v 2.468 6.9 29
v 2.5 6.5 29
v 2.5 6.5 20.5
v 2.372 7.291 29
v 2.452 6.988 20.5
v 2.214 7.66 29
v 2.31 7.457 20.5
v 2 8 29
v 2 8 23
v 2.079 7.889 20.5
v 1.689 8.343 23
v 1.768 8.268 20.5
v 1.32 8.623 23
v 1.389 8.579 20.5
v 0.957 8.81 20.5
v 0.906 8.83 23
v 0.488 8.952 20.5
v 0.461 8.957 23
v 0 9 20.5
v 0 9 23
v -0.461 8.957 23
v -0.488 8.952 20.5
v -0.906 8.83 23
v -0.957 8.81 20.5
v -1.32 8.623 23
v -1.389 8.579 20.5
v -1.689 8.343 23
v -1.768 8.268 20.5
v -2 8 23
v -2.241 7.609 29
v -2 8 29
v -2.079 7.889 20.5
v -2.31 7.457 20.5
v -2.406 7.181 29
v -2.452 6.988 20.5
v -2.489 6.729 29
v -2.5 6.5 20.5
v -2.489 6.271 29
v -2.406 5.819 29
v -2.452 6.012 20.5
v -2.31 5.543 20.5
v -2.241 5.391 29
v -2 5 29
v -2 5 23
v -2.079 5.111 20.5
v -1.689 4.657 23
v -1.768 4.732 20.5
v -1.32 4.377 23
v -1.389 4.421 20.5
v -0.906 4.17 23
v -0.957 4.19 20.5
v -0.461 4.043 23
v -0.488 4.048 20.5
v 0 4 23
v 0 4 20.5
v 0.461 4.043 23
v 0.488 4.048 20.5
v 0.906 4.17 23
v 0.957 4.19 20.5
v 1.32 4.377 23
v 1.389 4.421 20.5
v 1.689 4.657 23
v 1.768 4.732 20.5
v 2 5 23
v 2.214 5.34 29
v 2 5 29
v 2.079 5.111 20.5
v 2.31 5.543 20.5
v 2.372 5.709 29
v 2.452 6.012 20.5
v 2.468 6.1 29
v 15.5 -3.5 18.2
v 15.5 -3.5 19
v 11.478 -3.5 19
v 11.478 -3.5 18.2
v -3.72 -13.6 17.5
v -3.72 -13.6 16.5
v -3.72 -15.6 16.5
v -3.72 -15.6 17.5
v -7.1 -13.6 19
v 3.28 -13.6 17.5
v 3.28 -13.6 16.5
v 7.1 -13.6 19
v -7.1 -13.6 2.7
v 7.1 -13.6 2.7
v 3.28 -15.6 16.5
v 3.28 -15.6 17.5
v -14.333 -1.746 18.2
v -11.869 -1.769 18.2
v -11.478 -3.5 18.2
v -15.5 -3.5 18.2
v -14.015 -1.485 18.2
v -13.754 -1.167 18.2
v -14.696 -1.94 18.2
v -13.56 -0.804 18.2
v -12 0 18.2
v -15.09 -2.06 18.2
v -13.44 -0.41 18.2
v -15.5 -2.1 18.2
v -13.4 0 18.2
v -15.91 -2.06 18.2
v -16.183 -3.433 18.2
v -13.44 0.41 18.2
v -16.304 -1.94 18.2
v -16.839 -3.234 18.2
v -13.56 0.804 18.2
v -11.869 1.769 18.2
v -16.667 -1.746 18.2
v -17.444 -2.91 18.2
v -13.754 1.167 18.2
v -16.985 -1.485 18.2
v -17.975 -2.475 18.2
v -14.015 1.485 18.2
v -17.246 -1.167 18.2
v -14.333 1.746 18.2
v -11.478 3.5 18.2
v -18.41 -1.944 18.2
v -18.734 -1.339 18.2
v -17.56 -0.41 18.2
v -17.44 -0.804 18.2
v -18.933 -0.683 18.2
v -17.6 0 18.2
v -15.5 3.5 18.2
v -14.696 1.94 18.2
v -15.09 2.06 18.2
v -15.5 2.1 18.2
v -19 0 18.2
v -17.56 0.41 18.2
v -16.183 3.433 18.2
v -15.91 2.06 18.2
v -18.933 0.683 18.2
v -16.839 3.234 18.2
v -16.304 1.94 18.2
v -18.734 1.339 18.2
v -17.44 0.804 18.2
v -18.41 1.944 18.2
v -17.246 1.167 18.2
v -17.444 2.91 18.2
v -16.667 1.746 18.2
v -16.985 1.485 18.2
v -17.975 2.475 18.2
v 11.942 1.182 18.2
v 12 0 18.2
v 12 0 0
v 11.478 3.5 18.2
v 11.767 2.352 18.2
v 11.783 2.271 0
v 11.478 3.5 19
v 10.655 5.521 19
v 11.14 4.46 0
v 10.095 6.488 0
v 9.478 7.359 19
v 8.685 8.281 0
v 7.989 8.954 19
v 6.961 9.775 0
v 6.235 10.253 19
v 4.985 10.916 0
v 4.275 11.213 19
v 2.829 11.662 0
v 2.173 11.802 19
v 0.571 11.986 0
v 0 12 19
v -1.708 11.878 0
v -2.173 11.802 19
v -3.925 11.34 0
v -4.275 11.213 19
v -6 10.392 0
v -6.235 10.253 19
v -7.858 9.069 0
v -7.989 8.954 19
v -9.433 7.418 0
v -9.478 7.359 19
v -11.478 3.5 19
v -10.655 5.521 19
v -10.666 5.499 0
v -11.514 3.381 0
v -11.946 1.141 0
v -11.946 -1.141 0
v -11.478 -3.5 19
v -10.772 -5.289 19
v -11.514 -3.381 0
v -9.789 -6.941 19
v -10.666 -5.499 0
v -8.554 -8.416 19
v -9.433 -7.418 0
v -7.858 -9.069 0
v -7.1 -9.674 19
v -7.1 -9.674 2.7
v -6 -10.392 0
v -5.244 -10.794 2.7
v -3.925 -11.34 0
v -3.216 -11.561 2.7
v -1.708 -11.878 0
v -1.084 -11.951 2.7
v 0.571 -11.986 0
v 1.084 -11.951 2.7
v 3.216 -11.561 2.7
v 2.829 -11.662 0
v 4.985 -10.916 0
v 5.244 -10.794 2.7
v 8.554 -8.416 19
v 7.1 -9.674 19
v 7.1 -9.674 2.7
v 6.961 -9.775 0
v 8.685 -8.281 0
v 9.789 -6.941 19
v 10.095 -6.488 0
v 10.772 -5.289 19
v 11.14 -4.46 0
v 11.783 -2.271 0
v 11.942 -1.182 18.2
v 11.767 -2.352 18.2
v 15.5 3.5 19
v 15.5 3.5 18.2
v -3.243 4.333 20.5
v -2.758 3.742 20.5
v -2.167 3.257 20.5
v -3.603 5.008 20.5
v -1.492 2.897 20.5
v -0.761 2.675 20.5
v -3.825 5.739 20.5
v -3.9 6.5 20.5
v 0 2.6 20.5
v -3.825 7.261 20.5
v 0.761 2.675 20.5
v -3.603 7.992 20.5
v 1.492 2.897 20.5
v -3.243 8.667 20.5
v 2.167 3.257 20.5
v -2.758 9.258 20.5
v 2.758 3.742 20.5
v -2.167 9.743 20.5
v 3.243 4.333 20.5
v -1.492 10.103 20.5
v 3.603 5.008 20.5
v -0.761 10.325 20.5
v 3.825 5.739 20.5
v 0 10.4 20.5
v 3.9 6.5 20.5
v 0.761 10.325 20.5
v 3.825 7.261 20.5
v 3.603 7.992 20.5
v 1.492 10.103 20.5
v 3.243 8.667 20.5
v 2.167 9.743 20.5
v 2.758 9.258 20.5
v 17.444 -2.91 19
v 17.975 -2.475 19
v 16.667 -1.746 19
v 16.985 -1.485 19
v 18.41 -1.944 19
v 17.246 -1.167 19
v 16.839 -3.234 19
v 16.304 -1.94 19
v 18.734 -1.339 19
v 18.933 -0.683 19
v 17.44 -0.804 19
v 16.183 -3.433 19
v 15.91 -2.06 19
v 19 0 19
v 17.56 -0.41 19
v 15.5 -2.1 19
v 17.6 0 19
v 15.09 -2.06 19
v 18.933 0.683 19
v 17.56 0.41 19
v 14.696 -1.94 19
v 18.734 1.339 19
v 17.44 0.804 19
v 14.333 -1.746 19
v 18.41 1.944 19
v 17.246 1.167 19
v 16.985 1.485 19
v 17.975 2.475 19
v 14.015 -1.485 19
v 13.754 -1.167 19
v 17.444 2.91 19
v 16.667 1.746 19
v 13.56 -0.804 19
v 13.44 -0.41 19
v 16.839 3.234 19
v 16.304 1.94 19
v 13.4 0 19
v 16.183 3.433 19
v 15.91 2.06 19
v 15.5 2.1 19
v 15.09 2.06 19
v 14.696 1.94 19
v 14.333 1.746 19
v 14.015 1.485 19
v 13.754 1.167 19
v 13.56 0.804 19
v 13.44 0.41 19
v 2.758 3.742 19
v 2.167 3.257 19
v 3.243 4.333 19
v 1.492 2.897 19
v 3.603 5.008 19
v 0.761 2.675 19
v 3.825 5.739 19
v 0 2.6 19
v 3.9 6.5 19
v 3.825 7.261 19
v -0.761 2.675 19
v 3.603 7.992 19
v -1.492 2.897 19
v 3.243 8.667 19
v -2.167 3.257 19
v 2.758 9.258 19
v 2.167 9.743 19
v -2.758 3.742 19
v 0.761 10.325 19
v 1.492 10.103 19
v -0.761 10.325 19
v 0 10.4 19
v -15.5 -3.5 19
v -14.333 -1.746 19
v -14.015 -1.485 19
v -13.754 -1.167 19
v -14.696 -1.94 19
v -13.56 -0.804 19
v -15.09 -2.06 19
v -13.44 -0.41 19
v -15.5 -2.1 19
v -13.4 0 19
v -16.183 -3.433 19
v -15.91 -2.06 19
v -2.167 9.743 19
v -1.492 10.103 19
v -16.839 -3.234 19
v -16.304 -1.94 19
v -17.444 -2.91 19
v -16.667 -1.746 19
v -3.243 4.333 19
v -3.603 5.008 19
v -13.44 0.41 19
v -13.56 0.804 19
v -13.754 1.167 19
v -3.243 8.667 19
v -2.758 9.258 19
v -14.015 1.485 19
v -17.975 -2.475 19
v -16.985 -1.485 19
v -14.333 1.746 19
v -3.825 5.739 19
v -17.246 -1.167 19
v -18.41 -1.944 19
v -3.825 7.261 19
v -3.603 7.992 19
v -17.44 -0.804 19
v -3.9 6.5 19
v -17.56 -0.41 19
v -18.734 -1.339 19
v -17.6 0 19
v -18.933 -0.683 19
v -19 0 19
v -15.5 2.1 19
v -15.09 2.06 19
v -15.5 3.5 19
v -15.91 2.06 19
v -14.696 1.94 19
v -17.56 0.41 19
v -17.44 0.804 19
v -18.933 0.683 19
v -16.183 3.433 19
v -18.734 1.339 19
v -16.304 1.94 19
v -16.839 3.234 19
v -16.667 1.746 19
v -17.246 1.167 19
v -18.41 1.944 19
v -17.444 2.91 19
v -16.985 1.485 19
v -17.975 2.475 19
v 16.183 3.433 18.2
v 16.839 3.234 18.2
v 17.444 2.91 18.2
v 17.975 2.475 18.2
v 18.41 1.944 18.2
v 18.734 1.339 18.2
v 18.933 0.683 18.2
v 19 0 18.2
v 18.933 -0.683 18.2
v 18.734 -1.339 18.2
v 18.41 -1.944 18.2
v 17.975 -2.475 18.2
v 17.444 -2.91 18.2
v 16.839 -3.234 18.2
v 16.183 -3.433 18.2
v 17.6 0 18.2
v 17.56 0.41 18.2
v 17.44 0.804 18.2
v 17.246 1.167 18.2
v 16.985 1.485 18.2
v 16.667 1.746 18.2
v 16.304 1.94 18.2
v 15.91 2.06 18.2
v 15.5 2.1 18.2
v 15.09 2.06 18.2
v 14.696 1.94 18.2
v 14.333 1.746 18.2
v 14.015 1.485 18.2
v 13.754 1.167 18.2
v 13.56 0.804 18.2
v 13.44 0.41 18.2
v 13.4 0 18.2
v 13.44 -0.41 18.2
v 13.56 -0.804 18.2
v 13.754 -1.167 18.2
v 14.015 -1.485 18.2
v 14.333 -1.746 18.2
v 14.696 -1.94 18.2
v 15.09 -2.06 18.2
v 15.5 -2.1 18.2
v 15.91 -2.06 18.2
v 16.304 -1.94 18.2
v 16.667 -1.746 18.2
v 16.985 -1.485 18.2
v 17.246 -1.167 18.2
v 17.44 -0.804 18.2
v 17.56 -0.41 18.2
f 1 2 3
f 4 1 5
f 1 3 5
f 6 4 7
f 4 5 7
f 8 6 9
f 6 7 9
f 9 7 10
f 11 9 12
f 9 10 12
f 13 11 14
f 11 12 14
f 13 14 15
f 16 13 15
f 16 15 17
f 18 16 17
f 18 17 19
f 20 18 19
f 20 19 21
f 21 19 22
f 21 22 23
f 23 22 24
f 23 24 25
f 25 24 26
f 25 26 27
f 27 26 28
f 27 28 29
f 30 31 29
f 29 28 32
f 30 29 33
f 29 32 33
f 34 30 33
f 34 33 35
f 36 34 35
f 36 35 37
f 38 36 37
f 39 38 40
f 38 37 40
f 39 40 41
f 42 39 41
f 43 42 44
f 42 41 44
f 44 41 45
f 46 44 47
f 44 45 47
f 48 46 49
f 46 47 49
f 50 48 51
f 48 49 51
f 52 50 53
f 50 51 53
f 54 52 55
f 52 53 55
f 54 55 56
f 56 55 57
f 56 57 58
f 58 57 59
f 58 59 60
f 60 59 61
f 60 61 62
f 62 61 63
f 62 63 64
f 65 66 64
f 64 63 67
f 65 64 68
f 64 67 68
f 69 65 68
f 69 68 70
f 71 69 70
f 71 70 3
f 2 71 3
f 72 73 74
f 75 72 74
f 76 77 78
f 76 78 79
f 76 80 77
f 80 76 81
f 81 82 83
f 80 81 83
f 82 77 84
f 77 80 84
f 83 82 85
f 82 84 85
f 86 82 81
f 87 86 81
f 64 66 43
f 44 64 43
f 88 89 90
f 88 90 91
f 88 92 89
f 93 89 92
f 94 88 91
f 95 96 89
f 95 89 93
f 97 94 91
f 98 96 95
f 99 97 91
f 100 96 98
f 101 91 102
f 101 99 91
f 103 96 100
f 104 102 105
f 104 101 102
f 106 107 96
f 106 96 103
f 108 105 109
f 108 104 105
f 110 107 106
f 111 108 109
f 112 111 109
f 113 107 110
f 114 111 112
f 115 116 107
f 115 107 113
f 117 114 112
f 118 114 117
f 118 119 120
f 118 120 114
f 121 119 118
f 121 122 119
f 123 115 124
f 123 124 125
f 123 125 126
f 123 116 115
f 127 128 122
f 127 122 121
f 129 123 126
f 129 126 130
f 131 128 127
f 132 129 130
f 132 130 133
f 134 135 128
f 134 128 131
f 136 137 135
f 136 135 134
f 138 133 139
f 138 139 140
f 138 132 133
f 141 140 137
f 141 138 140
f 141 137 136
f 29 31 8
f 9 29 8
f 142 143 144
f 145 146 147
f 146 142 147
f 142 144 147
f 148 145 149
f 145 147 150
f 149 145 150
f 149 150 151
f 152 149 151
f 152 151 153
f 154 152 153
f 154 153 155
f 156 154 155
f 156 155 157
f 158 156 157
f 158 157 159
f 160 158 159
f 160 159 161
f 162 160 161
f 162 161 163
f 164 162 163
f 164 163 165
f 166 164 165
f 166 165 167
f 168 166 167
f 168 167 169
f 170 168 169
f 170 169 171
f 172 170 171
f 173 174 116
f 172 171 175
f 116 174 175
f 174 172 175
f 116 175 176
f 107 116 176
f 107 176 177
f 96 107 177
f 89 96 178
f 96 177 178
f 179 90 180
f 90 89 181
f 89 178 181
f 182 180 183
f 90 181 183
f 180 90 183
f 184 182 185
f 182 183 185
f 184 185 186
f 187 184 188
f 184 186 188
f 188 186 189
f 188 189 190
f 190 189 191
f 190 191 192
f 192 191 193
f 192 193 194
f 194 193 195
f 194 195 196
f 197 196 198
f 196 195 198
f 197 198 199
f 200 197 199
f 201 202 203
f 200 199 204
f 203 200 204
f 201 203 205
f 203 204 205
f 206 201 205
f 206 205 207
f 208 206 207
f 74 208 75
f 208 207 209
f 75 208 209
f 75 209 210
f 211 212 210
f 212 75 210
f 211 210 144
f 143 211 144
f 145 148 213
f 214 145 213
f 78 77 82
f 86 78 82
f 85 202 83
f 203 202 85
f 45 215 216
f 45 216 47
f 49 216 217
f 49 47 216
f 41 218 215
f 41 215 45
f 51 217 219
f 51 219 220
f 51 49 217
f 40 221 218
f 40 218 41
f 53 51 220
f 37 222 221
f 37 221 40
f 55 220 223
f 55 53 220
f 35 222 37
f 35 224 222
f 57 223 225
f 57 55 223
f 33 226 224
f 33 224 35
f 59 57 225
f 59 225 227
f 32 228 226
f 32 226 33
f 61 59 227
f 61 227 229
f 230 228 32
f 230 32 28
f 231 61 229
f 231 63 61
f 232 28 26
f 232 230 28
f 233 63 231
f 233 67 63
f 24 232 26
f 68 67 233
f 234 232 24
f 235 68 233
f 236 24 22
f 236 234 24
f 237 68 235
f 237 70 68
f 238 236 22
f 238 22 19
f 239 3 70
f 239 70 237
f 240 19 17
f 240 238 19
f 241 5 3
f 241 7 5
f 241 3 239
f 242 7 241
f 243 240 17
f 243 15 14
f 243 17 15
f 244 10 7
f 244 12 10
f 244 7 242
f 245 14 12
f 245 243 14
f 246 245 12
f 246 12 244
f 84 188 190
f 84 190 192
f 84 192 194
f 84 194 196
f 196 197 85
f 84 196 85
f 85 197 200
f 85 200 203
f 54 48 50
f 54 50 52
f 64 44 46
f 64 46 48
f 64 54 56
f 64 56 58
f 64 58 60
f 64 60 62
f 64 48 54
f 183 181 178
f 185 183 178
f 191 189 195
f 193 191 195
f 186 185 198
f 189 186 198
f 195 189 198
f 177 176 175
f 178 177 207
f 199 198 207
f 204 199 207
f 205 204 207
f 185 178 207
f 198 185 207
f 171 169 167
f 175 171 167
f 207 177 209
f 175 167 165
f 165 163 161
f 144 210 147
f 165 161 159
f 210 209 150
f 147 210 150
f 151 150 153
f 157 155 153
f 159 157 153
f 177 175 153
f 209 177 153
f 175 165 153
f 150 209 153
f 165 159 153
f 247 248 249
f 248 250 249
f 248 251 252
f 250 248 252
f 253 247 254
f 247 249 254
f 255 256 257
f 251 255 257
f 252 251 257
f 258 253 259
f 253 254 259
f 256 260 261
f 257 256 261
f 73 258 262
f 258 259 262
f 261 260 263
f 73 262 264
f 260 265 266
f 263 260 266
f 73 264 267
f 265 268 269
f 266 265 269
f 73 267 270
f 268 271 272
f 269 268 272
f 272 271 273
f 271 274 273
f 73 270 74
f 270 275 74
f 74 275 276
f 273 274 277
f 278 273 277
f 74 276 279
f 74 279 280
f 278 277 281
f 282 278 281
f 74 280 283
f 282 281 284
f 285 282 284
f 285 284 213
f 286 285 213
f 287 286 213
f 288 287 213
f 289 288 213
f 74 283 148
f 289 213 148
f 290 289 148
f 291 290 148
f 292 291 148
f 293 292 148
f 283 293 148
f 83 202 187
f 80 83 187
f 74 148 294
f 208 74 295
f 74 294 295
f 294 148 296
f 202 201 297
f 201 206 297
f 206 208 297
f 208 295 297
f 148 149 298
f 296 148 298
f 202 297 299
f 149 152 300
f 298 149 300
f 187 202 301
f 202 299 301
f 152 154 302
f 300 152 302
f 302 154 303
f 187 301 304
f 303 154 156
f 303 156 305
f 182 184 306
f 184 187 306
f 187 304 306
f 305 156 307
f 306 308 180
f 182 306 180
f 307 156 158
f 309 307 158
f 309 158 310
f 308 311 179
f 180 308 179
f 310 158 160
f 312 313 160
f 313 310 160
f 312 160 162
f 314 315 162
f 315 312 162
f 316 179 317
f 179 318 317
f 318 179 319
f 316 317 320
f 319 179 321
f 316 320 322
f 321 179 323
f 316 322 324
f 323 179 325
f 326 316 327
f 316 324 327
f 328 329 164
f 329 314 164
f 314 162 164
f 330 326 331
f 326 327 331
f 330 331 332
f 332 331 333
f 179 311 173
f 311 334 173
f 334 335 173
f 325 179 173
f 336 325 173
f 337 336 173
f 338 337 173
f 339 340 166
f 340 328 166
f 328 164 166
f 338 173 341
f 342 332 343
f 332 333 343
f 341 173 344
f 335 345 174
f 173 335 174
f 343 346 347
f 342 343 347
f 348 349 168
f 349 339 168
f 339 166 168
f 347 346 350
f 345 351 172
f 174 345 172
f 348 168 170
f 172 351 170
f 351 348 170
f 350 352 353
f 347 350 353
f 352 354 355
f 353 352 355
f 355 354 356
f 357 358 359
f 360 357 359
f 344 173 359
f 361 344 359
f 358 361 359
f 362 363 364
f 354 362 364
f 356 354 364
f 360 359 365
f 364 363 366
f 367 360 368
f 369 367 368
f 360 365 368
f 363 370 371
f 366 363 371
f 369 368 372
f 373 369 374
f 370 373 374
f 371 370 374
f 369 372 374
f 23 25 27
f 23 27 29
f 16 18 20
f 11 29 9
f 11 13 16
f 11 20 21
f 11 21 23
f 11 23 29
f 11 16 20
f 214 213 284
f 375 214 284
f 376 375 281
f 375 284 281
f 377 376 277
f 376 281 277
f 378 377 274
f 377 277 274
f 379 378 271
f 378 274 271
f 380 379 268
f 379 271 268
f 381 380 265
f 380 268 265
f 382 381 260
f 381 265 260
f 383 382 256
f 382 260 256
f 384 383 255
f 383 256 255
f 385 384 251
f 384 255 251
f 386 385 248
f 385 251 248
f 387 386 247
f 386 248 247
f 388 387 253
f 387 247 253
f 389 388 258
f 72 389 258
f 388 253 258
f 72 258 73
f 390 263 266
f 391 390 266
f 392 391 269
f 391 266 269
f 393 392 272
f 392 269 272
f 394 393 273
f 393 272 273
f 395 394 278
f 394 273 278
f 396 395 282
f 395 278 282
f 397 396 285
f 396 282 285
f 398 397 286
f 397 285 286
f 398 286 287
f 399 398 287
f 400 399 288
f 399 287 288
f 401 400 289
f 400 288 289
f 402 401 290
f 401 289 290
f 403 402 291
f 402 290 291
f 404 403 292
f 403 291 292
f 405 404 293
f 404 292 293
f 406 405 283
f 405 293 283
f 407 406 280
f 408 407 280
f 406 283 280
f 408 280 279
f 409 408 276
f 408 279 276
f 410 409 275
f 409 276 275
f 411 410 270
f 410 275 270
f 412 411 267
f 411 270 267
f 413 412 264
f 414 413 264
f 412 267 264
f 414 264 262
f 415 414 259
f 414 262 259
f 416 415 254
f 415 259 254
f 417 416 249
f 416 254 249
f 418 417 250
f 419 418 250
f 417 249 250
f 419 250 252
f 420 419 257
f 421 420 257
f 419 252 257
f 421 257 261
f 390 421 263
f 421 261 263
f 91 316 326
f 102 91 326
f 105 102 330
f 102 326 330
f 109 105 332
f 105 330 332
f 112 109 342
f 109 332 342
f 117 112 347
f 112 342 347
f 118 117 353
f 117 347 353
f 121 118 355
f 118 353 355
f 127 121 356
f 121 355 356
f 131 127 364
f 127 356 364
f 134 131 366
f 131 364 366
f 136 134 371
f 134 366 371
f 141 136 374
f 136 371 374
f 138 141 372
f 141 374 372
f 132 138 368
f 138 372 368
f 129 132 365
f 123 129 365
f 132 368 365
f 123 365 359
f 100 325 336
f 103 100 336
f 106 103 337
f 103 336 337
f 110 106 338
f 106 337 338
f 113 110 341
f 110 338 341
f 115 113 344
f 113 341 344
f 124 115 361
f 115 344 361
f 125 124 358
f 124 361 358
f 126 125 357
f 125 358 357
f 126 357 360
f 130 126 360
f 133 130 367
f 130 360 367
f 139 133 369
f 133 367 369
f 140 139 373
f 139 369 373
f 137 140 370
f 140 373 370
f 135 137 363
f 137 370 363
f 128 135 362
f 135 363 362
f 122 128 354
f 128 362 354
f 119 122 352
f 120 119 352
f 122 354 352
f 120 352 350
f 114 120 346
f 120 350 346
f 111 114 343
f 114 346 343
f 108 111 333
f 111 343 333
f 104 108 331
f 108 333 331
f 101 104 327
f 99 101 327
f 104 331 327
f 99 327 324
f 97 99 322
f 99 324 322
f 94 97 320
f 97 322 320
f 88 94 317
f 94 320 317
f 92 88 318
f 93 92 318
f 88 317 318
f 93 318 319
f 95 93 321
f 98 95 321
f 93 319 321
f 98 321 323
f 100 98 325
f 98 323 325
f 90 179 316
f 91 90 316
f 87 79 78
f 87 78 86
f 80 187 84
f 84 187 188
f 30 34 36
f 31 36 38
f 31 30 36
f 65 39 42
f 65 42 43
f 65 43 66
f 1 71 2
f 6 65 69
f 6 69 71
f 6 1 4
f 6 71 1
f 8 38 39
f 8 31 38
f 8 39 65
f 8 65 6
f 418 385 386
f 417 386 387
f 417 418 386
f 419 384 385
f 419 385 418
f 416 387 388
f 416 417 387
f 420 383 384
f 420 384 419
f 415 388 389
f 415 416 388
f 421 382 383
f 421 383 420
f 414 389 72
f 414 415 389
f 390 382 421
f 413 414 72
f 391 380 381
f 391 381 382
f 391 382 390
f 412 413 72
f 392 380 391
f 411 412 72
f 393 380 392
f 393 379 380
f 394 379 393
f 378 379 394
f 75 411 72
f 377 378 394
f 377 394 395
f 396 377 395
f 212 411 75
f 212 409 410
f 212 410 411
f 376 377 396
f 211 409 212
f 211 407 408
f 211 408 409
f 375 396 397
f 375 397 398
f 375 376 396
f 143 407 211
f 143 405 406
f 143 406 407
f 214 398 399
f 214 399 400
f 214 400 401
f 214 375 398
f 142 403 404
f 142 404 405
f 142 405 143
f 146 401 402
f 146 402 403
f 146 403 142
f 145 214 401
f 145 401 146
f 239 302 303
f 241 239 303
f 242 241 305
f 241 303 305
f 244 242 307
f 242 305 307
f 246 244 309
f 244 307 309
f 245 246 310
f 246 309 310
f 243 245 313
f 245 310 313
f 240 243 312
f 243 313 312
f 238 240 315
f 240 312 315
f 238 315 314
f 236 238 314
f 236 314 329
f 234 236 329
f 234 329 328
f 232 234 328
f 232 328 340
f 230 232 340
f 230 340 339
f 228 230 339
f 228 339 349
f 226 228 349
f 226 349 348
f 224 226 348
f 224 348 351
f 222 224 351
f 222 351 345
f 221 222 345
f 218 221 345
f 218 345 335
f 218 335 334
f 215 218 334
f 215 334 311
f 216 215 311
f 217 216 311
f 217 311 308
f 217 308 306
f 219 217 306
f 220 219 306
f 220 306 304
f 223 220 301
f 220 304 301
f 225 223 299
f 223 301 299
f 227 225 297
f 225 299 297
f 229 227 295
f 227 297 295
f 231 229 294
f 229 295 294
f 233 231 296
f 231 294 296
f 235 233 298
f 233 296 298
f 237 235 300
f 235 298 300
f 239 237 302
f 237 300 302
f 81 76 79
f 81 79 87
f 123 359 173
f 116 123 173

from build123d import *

# Parameters (mm, degrees)
SKETCH1_R           = 12
BOSS_EXTRUDE1_DEPTH = 19
SKETCH2_R           = 3.9
BOSS_EXTRUDE2_DEPTH = 1.5
SKETCH3_R           = 2.1
BOSS_EXTRUDE3_DEPTH = 0.8
SKETCH4_R           = 2.5
BOSS_EXTRUDE4_DEPTH = 8.5
CUT_EXTRUDE2_DEPTH  = 6
SKETCH6_W           = 14.2
SKETCH6_H           = 16.3
BOSS_EXTRUDE5_DEPTH = 13.6
SKETCH7_W           = 7
SKETCH7_H           = 1
BOSS_EXTRUDE6_DEPTH = 2


with BuildPart() as part:
    # Sketch1 → Boss-Extrude1 (new body)
    with BuildSketch(Plane.XY):
        Circle(SKETCH1_R)
    extrude(amount=BOSS_EXTRUDE1_DEPTH)

    # Sketch2 → Boss-Extrude2 (add)
    with BuildSketch(Plane.XY.offset(19)):
        with Locations((0, 6.5)):
            Circle(SKETCH2_R)
    extrude(amount=BOSS_EXTRUDE2_DEPTH)

    # Sketch3 → Boss-Extrude3 (add)
    with BuildSketch(Plane.XY.offset(19)):
        with BuildLine():
            Line((-15.5, 3.5), (15.5, 3.5))
            ThreePointArc((15.5, 3.5), (19, 0), (15.5, -3.5))
            Line((15.5, -3.5), (-15.5, -3.5))
            ThreePointArc((-15.5, -3.5), (-19, 0), (-15.5, 3.5))
        make_face()
        with Locations((-15.5, 0)):
            Circle(SKETCH3_R, mode=Mode.SUBTRACT)
        with Locations((15.5, 0)):
            Circle(SKETCH3_R, mode=Mode.SUBTRACT)
    extrude(amount=-BOSS_EXTRUDE3_DEPTH)

    # Sketch4 → Boss-Extrude4 (add)
    with BuildSketch(Plane.XY.offset(20.5)):
        with Locations((0, 6.5)):
            Circle(SKETCH4_R)
    extrude(amount=BOSS_EXTRUDE4_DEPTH)

    # Sketch5 → Cut-Extrude2 (cut)
    with BuildSketch(Plane.XY.offset(29)):
        with BuildLine():
            Line((-2, 8), (2, 8))
            ThreePointArc((2, 8), (0, 9), (-2, 8))
        make_face()
        with BuildLine():
            Line((2, 5), (-2, 5))
            ThreePointArc((-2, 5), (0, 4), (2, 5))
        make_face()
    extrude(amount=-CUT_EXTRUDE2_DEPTH, mode=Mode.SUBTRACT)

    # Sketch6 → Boss-Extrude5 (add)
    with BuildSketch(Plane(origin=(0, 0, 0), x_dir=(1, 0, 0), z_dir=(0, 1, 0))):
        with Locations((0, -10.85)):
            Rectangle(SKETCH6_W, SKETCH6_H)
    extrude(amount=-BOSS_EXTRUDE5_DEPTH)

    # Sketch7 → Boss-Extrude6 (add)
    with BuildSketch(Plane.XZ.offset(13.6)):
        with Locations((-0.219512042, 17)):
            Rectangle(SKETCH7_W, SKETCH7_H)
    extrude(amount=BOSS_EXTRUDE6_DEPTH)


solid = part.part
